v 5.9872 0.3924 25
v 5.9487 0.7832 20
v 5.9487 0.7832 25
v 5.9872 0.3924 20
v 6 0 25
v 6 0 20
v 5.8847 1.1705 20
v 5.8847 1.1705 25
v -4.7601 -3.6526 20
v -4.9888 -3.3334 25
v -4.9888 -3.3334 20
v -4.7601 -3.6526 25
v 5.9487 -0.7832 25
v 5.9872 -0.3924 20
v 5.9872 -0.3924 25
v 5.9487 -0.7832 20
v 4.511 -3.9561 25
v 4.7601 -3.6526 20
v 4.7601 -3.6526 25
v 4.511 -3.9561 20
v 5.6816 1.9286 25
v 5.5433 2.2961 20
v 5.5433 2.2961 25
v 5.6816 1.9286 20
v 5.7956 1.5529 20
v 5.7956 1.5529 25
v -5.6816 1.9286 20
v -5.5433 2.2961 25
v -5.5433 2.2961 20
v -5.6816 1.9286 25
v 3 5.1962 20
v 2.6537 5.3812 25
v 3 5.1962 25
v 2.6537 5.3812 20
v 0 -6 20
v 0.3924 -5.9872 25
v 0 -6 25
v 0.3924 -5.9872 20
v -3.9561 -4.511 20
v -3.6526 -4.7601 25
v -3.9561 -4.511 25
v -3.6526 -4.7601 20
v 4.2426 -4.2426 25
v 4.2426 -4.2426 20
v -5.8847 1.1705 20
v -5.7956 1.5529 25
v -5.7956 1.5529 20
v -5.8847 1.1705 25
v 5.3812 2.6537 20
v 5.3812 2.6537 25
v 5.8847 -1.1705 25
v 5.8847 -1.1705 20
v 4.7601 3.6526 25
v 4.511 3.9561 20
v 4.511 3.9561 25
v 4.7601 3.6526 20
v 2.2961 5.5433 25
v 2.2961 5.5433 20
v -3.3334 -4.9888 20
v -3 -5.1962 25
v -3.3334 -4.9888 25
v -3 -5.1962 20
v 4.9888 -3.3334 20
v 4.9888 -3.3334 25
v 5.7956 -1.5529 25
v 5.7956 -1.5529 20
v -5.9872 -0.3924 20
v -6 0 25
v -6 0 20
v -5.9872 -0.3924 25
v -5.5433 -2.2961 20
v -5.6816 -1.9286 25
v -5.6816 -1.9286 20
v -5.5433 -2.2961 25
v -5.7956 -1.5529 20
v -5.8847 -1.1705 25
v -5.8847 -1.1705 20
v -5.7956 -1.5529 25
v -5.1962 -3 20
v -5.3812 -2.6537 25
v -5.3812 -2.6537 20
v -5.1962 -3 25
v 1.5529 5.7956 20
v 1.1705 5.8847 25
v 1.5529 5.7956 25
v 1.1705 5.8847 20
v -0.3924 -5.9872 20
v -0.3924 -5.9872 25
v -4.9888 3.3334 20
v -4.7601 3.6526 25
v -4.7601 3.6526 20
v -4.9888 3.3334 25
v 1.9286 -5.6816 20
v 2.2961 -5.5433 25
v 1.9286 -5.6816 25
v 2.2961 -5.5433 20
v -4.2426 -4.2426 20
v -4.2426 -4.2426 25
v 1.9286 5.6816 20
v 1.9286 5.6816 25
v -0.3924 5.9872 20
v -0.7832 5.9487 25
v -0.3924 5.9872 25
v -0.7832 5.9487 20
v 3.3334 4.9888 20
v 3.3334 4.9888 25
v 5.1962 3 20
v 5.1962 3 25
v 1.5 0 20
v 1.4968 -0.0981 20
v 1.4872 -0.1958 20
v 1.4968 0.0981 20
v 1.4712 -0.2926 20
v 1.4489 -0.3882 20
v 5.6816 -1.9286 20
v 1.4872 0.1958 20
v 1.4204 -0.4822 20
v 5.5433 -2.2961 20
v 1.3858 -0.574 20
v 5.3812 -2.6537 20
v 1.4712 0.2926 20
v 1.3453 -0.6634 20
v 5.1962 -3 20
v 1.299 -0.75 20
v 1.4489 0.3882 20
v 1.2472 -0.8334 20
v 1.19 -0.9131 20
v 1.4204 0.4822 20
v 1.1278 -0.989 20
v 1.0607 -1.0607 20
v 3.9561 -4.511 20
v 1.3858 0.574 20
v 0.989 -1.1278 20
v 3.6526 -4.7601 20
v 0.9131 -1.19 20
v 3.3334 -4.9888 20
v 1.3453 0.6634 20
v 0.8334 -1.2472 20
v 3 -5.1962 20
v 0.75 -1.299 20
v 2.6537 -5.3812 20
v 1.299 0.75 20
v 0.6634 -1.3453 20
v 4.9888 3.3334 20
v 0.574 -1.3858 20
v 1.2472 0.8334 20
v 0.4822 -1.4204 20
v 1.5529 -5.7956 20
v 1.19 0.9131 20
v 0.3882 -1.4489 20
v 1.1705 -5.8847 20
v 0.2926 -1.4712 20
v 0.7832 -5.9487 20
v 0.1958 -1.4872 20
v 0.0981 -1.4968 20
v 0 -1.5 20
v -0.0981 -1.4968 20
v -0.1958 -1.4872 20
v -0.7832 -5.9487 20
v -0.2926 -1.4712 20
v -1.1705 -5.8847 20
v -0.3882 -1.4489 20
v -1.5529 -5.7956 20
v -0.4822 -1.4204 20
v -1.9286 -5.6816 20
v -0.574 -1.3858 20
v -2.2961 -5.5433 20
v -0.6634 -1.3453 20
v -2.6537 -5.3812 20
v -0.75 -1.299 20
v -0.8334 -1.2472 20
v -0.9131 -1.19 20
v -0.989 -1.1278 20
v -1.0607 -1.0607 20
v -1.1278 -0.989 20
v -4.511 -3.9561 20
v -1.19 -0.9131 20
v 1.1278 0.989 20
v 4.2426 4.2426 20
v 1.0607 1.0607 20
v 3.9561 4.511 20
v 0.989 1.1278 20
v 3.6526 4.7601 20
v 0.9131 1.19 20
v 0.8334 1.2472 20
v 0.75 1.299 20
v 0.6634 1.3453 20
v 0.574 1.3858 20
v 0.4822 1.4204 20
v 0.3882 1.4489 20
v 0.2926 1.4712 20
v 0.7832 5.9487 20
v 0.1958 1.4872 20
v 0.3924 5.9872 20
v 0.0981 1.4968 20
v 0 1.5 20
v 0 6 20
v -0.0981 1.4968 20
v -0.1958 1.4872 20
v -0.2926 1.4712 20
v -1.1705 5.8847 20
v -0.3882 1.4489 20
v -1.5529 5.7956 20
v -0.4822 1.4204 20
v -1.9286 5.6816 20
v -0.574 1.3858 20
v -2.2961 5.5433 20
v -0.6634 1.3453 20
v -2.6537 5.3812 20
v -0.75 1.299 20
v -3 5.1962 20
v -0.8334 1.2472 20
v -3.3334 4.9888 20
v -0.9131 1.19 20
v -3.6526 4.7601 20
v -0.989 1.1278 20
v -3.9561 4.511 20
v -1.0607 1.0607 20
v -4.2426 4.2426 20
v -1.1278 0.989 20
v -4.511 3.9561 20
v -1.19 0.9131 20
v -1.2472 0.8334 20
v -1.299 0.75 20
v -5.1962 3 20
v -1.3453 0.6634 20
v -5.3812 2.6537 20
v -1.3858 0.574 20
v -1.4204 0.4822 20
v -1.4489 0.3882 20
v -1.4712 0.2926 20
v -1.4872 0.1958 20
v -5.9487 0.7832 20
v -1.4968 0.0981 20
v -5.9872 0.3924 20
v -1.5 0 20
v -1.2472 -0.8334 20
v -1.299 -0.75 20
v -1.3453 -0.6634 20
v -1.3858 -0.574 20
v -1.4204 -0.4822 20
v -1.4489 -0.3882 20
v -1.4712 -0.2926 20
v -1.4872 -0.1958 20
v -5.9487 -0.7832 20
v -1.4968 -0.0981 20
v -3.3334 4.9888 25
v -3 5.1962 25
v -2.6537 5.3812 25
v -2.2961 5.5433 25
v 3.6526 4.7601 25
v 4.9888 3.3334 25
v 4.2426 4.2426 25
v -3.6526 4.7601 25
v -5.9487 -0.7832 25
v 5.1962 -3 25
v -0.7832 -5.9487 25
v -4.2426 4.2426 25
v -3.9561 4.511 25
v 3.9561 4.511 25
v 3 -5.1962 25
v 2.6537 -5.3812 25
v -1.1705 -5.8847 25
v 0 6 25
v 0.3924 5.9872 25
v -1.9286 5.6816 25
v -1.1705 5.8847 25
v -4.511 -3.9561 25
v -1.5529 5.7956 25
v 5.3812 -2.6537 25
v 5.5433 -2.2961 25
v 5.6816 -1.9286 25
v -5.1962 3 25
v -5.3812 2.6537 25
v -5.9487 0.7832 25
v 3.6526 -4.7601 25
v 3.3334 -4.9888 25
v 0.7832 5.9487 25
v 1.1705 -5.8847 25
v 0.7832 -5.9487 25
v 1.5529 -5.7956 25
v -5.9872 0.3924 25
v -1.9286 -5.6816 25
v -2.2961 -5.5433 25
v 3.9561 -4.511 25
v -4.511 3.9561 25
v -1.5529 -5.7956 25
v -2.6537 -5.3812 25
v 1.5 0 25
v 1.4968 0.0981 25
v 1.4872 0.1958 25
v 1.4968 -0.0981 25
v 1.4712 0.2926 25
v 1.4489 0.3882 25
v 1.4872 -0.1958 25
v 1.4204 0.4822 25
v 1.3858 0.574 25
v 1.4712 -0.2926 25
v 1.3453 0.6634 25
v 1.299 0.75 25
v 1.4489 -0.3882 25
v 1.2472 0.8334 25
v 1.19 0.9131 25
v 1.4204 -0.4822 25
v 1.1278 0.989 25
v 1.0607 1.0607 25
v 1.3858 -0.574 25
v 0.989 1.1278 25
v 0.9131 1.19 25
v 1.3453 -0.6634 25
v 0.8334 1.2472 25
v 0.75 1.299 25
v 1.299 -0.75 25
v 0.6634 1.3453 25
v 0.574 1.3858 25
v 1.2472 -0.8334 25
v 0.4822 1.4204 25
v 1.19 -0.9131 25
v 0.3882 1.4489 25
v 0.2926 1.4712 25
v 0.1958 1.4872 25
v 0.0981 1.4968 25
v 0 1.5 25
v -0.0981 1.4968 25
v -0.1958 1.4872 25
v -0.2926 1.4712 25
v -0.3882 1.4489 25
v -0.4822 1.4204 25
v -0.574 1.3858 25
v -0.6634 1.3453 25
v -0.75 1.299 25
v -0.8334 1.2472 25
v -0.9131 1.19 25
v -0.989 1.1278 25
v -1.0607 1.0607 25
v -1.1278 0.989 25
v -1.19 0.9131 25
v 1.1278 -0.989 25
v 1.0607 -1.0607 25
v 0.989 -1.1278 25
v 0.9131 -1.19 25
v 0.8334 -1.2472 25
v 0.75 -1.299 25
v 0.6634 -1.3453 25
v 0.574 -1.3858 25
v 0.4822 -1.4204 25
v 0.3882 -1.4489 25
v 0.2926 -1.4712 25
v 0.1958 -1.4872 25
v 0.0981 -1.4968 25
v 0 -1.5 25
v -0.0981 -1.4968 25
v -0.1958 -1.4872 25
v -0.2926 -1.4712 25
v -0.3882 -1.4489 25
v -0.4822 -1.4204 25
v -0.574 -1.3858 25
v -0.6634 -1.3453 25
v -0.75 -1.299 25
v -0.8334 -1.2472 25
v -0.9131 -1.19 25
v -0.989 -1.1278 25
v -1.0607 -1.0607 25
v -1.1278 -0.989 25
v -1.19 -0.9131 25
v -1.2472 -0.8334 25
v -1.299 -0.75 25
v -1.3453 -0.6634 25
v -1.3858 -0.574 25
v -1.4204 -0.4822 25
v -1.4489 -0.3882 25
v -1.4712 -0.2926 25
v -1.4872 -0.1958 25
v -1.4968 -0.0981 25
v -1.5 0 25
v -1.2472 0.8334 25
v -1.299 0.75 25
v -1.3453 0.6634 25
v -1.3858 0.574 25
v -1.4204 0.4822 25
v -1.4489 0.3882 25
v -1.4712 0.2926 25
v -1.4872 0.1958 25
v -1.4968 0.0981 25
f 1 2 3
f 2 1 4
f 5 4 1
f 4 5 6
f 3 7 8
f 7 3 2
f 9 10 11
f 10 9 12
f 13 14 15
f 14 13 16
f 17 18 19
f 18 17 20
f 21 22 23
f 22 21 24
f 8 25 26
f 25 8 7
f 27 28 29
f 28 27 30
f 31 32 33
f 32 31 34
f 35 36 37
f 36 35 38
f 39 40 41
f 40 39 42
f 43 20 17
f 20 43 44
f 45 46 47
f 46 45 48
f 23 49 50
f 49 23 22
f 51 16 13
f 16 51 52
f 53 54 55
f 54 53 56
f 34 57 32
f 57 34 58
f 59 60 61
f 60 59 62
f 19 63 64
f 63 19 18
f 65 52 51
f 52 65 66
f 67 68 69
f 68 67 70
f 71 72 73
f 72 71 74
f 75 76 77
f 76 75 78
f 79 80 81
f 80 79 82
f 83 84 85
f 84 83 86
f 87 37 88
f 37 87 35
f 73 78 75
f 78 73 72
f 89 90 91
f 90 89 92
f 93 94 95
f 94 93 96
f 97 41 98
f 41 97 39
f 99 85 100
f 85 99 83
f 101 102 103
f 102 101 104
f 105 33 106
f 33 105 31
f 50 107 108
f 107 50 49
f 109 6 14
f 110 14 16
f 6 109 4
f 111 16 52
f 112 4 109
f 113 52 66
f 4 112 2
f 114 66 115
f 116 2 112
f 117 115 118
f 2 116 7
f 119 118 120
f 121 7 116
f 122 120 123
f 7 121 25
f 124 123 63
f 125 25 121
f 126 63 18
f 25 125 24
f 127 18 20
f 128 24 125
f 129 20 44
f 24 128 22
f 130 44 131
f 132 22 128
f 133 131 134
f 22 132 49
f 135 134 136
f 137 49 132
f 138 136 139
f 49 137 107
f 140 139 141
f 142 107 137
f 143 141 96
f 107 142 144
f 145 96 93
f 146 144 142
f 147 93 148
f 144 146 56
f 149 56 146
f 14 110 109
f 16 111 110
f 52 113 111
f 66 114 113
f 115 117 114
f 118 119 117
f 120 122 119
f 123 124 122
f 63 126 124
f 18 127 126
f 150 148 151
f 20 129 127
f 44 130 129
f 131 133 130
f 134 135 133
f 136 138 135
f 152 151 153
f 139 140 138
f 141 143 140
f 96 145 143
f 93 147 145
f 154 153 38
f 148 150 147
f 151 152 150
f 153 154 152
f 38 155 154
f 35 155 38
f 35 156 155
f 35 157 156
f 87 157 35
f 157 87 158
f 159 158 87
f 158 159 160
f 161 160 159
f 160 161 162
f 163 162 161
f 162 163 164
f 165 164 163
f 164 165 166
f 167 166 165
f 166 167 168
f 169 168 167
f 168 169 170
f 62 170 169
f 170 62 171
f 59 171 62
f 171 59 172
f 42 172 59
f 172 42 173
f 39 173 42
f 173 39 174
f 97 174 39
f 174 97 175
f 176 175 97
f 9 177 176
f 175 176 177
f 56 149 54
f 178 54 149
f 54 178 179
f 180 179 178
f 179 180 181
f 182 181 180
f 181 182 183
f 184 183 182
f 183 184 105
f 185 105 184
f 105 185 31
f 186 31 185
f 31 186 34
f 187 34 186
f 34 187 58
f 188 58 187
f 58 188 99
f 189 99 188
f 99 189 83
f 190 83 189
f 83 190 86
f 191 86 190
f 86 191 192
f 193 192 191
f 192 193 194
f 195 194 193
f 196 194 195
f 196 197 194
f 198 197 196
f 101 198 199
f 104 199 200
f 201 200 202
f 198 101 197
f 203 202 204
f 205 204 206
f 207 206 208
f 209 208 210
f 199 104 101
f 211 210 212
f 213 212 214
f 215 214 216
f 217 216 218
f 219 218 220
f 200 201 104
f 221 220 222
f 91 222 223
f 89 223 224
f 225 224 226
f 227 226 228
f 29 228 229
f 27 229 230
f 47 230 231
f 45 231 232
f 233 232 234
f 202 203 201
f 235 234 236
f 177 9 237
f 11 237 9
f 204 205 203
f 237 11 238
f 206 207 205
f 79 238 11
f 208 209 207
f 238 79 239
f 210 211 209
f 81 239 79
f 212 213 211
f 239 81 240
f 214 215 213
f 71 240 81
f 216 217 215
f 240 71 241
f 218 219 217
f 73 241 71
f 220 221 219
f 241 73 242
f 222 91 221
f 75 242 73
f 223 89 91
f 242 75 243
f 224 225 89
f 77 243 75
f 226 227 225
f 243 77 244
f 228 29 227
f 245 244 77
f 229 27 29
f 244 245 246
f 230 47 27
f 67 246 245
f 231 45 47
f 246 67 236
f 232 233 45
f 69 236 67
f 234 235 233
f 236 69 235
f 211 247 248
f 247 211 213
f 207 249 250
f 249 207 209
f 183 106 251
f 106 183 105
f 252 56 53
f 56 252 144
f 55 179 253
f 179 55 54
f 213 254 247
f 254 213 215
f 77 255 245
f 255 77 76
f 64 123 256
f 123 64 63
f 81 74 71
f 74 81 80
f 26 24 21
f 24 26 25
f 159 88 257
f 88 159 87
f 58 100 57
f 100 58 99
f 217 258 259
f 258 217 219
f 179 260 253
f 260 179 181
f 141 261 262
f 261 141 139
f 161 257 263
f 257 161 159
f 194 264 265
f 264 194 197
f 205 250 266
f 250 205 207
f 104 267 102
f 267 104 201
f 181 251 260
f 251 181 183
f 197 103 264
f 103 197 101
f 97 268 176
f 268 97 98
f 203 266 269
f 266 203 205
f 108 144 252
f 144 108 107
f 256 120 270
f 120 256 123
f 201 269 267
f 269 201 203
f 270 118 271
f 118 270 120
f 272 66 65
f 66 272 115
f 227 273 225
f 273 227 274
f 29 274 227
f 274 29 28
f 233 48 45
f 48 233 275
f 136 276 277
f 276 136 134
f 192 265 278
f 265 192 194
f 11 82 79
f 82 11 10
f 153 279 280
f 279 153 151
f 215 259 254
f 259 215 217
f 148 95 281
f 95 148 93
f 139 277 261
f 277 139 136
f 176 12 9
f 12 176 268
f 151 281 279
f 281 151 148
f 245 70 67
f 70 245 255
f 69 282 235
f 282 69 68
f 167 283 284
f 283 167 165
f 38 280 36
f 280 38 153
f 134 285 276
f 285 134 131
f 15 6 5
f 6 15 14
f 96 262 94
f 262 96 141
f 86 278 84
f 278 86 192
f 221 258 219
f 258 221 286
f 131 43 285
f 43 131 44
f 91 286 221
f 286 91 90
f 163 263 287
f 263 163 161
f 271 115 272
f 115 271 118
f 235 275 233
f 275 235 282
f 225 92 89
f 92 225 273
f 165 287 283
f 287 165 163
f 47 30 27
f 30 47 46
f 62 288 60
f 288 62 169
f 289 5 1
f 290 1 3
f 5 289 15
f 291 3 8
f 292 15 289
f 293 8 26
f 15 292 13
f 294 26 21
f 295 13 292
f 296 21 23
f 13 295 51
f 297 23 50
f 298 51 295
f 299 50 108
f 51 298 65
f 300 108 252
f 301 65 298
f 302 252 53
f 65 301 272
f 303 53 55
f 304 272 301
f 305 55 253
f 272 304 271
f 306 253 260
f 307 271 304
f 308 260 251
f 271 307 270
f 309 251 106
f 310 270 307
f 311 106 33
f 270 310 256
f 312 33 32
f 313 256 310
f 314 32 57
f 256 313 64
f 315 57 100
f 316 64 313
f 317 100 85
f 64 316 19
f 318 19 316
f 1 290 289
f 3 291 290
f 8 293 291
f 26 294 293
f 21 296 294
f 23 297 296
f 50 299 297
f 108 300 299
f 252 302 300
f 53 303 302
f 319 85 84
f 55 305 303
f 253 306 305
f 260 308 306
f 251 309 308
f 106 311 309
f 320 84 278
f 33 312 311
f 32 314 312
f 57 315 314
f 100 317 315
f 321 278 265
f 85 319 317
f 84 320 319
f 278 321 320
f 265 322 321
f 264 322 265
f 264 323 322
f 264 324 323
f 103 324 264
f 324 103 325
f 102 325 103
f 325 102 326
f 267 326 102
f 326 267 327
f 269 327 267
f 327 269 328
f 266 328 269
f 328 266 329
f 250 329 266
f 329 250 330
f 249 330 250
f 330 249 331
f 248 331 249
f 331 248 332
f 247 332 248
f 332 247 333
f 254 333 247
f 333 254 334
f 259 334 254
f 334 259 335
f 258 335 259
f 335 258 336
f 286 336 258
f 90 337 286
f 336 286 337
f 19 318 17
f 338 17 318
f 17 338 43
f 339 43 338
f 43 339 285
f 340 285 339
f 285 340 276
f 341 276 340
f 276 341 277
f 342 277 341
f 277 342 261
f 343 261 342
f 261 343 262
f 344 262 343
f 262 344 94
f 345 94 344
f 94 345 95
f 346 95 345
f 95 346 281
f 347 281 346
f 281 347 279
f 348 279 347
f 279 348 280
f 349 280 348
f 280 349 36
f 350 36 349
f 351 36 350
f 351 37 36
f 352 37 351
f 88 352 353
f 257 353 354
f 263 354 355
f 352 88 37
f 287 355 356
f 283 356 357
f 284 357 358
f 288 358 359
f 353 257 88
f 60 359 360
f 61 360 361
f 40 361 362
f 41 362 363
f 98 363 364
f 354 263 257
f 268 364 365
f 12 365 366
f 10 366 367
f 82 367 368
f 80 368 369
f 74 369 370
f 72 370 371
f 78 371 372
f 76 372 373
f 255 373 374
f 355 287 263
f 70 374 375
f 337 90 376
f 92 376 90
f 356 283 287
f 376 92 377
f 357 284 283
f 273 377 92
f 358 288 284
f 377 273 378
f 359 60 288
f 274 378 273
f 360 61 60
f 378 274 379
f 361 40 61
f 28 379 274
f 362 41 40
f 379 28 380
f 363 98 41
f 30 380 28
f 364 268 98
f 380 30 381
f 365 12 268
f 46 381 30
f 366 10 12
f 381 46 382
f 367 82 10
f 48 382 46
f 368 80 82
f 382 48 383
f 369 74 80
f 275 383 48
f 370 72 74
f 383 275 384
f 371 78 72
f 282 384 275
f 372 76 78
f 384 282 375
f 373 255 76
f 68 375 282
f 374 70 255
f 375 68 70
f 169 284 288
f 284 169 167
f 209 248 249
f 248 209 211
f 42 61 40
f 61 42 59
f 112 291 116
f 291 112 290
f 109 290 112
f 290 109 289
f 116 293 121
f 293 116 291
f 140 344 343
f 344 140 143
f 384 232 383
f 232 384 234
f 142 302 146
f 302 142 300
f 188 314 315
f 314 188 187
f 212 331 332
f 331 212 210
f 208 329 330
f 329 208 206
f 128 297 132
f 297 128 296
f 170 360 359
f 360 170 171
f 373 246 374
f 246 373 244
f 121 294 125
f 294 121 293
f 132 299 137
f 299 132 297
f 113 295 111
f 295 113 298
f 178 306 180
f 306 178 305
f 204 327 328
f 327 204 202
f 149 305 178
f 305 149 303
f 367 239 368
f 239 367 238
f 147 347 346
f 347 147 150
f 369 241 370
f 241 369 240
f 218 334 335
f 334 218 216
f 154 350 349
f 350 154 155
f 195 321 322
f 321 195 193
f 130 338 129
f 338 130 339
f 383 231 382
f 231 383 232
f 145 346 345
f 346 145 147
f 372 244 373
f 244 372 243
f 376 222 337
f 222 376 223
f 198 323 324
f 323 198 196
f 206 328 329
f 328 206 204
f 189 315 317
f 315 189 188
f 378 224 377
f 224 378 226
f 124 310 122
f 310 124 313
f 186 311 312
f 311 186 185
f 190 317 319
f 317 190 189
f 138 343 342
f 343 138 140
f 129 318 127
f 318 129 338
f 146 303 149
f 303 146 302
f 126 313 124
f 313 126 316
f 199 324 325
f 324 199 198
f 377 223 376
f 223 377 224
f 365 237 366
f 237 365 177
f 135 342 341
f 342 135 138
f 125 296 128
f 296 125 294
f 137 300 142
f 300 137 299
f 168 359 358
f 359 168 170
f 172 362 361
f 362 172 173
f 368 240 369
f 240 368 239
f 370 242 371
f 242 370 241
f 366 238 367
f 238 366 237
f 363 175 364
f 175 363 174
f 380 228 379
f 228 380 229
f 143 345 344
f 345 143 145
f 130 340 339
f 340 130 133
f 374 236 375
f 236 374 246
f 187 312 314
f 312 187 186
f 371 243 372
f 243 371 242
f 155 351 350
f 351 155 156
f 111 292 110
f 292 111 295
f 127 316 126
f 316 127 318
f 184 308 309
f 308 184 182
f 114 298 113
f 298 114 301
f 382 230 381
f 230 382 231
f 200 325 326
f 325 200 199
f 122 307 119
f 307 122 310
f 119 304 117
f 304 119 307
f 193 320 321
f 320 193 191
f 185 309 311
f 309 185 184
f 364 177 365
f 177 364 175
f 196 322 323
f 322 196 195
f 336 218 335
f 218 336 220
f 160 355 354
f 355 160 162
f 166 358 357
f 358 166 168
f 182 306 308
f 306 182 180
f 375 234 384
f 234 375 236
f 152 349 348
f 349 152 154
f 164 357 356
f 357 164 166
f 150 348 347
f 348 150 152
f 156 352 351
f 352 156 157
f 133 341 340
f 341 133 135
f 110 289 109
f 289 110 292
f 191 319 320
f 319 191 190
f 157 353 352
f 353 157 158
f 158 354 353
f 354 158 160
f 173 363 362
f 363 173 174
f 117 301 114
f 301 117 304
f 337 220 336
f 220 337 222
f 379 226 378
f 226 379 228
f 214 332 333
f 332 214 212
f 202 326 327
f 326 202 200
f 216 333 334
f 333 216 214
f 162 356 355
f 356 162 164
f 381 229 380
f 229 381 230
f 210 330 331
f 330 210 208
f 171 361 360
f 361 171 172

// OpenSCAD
// Hose-barb reducer: joins 8 mm inner-diameter silicone tubing to 5 mm inner-diameter tubing
// Print orientation: standing upright along +Z, centred on origin in X/Y
// Units: mm

$fn = 96;

// ---- Bore ----
bore = 3;

// ---- 8 mm tubing side (z = 0 to 20) ----
z0      = 0;
z_barb1 = 20;
barb_h  = 10;
barb_d0 = 7.5;   // outer diameter at bottom of each barb
barb_d1 = 9.5;   // outer diameter at top of each barb

// ---- 5 mm tubing side (z = 25 to 41) ----
z_barb2 = 25;
z_top   = 41;
barb_h2 = 8;
barb_d2 = 6.5;   // outer diameter at bottom of each barb
barb_d3 = 5.0;   // outer diameter at top of each barb

// ---- Collar (z = 20 to 25) ----
z_collar0 = 20;
z_collar1 = 25;
collar_d  = 12;

// ---- Stacking clearance ----
eps = 0.5;

// Derived
n_barb1 = 2;
n_barb2 = 2;
d_barb1_top = (barb_d0 + barb_d1) / 2;  // diameter at the sawtooth peak
d_barb2_top = (barb_d2 + barb_d3) / 2;

difference() {
    union() {
        // 8 mm tubing barbs
        for (i = [0 : n_barb1 - 1]) {
            translate([0, 0, z0 + i * (barb_h + eps)])
                linear_extrude(height = barb_h)
                    hull() {
                        for (j = [0 : 1])
                            translate([0, 0, j * eps])
                                cylinder(d = barb_d0 + j * (barb_d1 - barb_d0));
                    }
        }
        // 5 mm tubing barbs
        for (i = [0 : n_barb2 - 1])
            translate([0, 0, z_barb2 + i * (barb_h2 + eps)])
                linear_extrude(height = barb_h2)
                    hull() {
                        for (j = [0 : 1])
                            translate([0, 0, j * eps])
                                cylinder(d = barb_d2 + j * (barb_d3 - barb_d2));
                    }
        // Cylindrical collar
        translate([0, 0, z_collar0])
            cylinder(d = collar_d, h = z_collar1 - z_collar0);
    }
    // Through bore
    translate([0, 0, -1])
        cylinder(d = bore, h = z_top + 2);
}
